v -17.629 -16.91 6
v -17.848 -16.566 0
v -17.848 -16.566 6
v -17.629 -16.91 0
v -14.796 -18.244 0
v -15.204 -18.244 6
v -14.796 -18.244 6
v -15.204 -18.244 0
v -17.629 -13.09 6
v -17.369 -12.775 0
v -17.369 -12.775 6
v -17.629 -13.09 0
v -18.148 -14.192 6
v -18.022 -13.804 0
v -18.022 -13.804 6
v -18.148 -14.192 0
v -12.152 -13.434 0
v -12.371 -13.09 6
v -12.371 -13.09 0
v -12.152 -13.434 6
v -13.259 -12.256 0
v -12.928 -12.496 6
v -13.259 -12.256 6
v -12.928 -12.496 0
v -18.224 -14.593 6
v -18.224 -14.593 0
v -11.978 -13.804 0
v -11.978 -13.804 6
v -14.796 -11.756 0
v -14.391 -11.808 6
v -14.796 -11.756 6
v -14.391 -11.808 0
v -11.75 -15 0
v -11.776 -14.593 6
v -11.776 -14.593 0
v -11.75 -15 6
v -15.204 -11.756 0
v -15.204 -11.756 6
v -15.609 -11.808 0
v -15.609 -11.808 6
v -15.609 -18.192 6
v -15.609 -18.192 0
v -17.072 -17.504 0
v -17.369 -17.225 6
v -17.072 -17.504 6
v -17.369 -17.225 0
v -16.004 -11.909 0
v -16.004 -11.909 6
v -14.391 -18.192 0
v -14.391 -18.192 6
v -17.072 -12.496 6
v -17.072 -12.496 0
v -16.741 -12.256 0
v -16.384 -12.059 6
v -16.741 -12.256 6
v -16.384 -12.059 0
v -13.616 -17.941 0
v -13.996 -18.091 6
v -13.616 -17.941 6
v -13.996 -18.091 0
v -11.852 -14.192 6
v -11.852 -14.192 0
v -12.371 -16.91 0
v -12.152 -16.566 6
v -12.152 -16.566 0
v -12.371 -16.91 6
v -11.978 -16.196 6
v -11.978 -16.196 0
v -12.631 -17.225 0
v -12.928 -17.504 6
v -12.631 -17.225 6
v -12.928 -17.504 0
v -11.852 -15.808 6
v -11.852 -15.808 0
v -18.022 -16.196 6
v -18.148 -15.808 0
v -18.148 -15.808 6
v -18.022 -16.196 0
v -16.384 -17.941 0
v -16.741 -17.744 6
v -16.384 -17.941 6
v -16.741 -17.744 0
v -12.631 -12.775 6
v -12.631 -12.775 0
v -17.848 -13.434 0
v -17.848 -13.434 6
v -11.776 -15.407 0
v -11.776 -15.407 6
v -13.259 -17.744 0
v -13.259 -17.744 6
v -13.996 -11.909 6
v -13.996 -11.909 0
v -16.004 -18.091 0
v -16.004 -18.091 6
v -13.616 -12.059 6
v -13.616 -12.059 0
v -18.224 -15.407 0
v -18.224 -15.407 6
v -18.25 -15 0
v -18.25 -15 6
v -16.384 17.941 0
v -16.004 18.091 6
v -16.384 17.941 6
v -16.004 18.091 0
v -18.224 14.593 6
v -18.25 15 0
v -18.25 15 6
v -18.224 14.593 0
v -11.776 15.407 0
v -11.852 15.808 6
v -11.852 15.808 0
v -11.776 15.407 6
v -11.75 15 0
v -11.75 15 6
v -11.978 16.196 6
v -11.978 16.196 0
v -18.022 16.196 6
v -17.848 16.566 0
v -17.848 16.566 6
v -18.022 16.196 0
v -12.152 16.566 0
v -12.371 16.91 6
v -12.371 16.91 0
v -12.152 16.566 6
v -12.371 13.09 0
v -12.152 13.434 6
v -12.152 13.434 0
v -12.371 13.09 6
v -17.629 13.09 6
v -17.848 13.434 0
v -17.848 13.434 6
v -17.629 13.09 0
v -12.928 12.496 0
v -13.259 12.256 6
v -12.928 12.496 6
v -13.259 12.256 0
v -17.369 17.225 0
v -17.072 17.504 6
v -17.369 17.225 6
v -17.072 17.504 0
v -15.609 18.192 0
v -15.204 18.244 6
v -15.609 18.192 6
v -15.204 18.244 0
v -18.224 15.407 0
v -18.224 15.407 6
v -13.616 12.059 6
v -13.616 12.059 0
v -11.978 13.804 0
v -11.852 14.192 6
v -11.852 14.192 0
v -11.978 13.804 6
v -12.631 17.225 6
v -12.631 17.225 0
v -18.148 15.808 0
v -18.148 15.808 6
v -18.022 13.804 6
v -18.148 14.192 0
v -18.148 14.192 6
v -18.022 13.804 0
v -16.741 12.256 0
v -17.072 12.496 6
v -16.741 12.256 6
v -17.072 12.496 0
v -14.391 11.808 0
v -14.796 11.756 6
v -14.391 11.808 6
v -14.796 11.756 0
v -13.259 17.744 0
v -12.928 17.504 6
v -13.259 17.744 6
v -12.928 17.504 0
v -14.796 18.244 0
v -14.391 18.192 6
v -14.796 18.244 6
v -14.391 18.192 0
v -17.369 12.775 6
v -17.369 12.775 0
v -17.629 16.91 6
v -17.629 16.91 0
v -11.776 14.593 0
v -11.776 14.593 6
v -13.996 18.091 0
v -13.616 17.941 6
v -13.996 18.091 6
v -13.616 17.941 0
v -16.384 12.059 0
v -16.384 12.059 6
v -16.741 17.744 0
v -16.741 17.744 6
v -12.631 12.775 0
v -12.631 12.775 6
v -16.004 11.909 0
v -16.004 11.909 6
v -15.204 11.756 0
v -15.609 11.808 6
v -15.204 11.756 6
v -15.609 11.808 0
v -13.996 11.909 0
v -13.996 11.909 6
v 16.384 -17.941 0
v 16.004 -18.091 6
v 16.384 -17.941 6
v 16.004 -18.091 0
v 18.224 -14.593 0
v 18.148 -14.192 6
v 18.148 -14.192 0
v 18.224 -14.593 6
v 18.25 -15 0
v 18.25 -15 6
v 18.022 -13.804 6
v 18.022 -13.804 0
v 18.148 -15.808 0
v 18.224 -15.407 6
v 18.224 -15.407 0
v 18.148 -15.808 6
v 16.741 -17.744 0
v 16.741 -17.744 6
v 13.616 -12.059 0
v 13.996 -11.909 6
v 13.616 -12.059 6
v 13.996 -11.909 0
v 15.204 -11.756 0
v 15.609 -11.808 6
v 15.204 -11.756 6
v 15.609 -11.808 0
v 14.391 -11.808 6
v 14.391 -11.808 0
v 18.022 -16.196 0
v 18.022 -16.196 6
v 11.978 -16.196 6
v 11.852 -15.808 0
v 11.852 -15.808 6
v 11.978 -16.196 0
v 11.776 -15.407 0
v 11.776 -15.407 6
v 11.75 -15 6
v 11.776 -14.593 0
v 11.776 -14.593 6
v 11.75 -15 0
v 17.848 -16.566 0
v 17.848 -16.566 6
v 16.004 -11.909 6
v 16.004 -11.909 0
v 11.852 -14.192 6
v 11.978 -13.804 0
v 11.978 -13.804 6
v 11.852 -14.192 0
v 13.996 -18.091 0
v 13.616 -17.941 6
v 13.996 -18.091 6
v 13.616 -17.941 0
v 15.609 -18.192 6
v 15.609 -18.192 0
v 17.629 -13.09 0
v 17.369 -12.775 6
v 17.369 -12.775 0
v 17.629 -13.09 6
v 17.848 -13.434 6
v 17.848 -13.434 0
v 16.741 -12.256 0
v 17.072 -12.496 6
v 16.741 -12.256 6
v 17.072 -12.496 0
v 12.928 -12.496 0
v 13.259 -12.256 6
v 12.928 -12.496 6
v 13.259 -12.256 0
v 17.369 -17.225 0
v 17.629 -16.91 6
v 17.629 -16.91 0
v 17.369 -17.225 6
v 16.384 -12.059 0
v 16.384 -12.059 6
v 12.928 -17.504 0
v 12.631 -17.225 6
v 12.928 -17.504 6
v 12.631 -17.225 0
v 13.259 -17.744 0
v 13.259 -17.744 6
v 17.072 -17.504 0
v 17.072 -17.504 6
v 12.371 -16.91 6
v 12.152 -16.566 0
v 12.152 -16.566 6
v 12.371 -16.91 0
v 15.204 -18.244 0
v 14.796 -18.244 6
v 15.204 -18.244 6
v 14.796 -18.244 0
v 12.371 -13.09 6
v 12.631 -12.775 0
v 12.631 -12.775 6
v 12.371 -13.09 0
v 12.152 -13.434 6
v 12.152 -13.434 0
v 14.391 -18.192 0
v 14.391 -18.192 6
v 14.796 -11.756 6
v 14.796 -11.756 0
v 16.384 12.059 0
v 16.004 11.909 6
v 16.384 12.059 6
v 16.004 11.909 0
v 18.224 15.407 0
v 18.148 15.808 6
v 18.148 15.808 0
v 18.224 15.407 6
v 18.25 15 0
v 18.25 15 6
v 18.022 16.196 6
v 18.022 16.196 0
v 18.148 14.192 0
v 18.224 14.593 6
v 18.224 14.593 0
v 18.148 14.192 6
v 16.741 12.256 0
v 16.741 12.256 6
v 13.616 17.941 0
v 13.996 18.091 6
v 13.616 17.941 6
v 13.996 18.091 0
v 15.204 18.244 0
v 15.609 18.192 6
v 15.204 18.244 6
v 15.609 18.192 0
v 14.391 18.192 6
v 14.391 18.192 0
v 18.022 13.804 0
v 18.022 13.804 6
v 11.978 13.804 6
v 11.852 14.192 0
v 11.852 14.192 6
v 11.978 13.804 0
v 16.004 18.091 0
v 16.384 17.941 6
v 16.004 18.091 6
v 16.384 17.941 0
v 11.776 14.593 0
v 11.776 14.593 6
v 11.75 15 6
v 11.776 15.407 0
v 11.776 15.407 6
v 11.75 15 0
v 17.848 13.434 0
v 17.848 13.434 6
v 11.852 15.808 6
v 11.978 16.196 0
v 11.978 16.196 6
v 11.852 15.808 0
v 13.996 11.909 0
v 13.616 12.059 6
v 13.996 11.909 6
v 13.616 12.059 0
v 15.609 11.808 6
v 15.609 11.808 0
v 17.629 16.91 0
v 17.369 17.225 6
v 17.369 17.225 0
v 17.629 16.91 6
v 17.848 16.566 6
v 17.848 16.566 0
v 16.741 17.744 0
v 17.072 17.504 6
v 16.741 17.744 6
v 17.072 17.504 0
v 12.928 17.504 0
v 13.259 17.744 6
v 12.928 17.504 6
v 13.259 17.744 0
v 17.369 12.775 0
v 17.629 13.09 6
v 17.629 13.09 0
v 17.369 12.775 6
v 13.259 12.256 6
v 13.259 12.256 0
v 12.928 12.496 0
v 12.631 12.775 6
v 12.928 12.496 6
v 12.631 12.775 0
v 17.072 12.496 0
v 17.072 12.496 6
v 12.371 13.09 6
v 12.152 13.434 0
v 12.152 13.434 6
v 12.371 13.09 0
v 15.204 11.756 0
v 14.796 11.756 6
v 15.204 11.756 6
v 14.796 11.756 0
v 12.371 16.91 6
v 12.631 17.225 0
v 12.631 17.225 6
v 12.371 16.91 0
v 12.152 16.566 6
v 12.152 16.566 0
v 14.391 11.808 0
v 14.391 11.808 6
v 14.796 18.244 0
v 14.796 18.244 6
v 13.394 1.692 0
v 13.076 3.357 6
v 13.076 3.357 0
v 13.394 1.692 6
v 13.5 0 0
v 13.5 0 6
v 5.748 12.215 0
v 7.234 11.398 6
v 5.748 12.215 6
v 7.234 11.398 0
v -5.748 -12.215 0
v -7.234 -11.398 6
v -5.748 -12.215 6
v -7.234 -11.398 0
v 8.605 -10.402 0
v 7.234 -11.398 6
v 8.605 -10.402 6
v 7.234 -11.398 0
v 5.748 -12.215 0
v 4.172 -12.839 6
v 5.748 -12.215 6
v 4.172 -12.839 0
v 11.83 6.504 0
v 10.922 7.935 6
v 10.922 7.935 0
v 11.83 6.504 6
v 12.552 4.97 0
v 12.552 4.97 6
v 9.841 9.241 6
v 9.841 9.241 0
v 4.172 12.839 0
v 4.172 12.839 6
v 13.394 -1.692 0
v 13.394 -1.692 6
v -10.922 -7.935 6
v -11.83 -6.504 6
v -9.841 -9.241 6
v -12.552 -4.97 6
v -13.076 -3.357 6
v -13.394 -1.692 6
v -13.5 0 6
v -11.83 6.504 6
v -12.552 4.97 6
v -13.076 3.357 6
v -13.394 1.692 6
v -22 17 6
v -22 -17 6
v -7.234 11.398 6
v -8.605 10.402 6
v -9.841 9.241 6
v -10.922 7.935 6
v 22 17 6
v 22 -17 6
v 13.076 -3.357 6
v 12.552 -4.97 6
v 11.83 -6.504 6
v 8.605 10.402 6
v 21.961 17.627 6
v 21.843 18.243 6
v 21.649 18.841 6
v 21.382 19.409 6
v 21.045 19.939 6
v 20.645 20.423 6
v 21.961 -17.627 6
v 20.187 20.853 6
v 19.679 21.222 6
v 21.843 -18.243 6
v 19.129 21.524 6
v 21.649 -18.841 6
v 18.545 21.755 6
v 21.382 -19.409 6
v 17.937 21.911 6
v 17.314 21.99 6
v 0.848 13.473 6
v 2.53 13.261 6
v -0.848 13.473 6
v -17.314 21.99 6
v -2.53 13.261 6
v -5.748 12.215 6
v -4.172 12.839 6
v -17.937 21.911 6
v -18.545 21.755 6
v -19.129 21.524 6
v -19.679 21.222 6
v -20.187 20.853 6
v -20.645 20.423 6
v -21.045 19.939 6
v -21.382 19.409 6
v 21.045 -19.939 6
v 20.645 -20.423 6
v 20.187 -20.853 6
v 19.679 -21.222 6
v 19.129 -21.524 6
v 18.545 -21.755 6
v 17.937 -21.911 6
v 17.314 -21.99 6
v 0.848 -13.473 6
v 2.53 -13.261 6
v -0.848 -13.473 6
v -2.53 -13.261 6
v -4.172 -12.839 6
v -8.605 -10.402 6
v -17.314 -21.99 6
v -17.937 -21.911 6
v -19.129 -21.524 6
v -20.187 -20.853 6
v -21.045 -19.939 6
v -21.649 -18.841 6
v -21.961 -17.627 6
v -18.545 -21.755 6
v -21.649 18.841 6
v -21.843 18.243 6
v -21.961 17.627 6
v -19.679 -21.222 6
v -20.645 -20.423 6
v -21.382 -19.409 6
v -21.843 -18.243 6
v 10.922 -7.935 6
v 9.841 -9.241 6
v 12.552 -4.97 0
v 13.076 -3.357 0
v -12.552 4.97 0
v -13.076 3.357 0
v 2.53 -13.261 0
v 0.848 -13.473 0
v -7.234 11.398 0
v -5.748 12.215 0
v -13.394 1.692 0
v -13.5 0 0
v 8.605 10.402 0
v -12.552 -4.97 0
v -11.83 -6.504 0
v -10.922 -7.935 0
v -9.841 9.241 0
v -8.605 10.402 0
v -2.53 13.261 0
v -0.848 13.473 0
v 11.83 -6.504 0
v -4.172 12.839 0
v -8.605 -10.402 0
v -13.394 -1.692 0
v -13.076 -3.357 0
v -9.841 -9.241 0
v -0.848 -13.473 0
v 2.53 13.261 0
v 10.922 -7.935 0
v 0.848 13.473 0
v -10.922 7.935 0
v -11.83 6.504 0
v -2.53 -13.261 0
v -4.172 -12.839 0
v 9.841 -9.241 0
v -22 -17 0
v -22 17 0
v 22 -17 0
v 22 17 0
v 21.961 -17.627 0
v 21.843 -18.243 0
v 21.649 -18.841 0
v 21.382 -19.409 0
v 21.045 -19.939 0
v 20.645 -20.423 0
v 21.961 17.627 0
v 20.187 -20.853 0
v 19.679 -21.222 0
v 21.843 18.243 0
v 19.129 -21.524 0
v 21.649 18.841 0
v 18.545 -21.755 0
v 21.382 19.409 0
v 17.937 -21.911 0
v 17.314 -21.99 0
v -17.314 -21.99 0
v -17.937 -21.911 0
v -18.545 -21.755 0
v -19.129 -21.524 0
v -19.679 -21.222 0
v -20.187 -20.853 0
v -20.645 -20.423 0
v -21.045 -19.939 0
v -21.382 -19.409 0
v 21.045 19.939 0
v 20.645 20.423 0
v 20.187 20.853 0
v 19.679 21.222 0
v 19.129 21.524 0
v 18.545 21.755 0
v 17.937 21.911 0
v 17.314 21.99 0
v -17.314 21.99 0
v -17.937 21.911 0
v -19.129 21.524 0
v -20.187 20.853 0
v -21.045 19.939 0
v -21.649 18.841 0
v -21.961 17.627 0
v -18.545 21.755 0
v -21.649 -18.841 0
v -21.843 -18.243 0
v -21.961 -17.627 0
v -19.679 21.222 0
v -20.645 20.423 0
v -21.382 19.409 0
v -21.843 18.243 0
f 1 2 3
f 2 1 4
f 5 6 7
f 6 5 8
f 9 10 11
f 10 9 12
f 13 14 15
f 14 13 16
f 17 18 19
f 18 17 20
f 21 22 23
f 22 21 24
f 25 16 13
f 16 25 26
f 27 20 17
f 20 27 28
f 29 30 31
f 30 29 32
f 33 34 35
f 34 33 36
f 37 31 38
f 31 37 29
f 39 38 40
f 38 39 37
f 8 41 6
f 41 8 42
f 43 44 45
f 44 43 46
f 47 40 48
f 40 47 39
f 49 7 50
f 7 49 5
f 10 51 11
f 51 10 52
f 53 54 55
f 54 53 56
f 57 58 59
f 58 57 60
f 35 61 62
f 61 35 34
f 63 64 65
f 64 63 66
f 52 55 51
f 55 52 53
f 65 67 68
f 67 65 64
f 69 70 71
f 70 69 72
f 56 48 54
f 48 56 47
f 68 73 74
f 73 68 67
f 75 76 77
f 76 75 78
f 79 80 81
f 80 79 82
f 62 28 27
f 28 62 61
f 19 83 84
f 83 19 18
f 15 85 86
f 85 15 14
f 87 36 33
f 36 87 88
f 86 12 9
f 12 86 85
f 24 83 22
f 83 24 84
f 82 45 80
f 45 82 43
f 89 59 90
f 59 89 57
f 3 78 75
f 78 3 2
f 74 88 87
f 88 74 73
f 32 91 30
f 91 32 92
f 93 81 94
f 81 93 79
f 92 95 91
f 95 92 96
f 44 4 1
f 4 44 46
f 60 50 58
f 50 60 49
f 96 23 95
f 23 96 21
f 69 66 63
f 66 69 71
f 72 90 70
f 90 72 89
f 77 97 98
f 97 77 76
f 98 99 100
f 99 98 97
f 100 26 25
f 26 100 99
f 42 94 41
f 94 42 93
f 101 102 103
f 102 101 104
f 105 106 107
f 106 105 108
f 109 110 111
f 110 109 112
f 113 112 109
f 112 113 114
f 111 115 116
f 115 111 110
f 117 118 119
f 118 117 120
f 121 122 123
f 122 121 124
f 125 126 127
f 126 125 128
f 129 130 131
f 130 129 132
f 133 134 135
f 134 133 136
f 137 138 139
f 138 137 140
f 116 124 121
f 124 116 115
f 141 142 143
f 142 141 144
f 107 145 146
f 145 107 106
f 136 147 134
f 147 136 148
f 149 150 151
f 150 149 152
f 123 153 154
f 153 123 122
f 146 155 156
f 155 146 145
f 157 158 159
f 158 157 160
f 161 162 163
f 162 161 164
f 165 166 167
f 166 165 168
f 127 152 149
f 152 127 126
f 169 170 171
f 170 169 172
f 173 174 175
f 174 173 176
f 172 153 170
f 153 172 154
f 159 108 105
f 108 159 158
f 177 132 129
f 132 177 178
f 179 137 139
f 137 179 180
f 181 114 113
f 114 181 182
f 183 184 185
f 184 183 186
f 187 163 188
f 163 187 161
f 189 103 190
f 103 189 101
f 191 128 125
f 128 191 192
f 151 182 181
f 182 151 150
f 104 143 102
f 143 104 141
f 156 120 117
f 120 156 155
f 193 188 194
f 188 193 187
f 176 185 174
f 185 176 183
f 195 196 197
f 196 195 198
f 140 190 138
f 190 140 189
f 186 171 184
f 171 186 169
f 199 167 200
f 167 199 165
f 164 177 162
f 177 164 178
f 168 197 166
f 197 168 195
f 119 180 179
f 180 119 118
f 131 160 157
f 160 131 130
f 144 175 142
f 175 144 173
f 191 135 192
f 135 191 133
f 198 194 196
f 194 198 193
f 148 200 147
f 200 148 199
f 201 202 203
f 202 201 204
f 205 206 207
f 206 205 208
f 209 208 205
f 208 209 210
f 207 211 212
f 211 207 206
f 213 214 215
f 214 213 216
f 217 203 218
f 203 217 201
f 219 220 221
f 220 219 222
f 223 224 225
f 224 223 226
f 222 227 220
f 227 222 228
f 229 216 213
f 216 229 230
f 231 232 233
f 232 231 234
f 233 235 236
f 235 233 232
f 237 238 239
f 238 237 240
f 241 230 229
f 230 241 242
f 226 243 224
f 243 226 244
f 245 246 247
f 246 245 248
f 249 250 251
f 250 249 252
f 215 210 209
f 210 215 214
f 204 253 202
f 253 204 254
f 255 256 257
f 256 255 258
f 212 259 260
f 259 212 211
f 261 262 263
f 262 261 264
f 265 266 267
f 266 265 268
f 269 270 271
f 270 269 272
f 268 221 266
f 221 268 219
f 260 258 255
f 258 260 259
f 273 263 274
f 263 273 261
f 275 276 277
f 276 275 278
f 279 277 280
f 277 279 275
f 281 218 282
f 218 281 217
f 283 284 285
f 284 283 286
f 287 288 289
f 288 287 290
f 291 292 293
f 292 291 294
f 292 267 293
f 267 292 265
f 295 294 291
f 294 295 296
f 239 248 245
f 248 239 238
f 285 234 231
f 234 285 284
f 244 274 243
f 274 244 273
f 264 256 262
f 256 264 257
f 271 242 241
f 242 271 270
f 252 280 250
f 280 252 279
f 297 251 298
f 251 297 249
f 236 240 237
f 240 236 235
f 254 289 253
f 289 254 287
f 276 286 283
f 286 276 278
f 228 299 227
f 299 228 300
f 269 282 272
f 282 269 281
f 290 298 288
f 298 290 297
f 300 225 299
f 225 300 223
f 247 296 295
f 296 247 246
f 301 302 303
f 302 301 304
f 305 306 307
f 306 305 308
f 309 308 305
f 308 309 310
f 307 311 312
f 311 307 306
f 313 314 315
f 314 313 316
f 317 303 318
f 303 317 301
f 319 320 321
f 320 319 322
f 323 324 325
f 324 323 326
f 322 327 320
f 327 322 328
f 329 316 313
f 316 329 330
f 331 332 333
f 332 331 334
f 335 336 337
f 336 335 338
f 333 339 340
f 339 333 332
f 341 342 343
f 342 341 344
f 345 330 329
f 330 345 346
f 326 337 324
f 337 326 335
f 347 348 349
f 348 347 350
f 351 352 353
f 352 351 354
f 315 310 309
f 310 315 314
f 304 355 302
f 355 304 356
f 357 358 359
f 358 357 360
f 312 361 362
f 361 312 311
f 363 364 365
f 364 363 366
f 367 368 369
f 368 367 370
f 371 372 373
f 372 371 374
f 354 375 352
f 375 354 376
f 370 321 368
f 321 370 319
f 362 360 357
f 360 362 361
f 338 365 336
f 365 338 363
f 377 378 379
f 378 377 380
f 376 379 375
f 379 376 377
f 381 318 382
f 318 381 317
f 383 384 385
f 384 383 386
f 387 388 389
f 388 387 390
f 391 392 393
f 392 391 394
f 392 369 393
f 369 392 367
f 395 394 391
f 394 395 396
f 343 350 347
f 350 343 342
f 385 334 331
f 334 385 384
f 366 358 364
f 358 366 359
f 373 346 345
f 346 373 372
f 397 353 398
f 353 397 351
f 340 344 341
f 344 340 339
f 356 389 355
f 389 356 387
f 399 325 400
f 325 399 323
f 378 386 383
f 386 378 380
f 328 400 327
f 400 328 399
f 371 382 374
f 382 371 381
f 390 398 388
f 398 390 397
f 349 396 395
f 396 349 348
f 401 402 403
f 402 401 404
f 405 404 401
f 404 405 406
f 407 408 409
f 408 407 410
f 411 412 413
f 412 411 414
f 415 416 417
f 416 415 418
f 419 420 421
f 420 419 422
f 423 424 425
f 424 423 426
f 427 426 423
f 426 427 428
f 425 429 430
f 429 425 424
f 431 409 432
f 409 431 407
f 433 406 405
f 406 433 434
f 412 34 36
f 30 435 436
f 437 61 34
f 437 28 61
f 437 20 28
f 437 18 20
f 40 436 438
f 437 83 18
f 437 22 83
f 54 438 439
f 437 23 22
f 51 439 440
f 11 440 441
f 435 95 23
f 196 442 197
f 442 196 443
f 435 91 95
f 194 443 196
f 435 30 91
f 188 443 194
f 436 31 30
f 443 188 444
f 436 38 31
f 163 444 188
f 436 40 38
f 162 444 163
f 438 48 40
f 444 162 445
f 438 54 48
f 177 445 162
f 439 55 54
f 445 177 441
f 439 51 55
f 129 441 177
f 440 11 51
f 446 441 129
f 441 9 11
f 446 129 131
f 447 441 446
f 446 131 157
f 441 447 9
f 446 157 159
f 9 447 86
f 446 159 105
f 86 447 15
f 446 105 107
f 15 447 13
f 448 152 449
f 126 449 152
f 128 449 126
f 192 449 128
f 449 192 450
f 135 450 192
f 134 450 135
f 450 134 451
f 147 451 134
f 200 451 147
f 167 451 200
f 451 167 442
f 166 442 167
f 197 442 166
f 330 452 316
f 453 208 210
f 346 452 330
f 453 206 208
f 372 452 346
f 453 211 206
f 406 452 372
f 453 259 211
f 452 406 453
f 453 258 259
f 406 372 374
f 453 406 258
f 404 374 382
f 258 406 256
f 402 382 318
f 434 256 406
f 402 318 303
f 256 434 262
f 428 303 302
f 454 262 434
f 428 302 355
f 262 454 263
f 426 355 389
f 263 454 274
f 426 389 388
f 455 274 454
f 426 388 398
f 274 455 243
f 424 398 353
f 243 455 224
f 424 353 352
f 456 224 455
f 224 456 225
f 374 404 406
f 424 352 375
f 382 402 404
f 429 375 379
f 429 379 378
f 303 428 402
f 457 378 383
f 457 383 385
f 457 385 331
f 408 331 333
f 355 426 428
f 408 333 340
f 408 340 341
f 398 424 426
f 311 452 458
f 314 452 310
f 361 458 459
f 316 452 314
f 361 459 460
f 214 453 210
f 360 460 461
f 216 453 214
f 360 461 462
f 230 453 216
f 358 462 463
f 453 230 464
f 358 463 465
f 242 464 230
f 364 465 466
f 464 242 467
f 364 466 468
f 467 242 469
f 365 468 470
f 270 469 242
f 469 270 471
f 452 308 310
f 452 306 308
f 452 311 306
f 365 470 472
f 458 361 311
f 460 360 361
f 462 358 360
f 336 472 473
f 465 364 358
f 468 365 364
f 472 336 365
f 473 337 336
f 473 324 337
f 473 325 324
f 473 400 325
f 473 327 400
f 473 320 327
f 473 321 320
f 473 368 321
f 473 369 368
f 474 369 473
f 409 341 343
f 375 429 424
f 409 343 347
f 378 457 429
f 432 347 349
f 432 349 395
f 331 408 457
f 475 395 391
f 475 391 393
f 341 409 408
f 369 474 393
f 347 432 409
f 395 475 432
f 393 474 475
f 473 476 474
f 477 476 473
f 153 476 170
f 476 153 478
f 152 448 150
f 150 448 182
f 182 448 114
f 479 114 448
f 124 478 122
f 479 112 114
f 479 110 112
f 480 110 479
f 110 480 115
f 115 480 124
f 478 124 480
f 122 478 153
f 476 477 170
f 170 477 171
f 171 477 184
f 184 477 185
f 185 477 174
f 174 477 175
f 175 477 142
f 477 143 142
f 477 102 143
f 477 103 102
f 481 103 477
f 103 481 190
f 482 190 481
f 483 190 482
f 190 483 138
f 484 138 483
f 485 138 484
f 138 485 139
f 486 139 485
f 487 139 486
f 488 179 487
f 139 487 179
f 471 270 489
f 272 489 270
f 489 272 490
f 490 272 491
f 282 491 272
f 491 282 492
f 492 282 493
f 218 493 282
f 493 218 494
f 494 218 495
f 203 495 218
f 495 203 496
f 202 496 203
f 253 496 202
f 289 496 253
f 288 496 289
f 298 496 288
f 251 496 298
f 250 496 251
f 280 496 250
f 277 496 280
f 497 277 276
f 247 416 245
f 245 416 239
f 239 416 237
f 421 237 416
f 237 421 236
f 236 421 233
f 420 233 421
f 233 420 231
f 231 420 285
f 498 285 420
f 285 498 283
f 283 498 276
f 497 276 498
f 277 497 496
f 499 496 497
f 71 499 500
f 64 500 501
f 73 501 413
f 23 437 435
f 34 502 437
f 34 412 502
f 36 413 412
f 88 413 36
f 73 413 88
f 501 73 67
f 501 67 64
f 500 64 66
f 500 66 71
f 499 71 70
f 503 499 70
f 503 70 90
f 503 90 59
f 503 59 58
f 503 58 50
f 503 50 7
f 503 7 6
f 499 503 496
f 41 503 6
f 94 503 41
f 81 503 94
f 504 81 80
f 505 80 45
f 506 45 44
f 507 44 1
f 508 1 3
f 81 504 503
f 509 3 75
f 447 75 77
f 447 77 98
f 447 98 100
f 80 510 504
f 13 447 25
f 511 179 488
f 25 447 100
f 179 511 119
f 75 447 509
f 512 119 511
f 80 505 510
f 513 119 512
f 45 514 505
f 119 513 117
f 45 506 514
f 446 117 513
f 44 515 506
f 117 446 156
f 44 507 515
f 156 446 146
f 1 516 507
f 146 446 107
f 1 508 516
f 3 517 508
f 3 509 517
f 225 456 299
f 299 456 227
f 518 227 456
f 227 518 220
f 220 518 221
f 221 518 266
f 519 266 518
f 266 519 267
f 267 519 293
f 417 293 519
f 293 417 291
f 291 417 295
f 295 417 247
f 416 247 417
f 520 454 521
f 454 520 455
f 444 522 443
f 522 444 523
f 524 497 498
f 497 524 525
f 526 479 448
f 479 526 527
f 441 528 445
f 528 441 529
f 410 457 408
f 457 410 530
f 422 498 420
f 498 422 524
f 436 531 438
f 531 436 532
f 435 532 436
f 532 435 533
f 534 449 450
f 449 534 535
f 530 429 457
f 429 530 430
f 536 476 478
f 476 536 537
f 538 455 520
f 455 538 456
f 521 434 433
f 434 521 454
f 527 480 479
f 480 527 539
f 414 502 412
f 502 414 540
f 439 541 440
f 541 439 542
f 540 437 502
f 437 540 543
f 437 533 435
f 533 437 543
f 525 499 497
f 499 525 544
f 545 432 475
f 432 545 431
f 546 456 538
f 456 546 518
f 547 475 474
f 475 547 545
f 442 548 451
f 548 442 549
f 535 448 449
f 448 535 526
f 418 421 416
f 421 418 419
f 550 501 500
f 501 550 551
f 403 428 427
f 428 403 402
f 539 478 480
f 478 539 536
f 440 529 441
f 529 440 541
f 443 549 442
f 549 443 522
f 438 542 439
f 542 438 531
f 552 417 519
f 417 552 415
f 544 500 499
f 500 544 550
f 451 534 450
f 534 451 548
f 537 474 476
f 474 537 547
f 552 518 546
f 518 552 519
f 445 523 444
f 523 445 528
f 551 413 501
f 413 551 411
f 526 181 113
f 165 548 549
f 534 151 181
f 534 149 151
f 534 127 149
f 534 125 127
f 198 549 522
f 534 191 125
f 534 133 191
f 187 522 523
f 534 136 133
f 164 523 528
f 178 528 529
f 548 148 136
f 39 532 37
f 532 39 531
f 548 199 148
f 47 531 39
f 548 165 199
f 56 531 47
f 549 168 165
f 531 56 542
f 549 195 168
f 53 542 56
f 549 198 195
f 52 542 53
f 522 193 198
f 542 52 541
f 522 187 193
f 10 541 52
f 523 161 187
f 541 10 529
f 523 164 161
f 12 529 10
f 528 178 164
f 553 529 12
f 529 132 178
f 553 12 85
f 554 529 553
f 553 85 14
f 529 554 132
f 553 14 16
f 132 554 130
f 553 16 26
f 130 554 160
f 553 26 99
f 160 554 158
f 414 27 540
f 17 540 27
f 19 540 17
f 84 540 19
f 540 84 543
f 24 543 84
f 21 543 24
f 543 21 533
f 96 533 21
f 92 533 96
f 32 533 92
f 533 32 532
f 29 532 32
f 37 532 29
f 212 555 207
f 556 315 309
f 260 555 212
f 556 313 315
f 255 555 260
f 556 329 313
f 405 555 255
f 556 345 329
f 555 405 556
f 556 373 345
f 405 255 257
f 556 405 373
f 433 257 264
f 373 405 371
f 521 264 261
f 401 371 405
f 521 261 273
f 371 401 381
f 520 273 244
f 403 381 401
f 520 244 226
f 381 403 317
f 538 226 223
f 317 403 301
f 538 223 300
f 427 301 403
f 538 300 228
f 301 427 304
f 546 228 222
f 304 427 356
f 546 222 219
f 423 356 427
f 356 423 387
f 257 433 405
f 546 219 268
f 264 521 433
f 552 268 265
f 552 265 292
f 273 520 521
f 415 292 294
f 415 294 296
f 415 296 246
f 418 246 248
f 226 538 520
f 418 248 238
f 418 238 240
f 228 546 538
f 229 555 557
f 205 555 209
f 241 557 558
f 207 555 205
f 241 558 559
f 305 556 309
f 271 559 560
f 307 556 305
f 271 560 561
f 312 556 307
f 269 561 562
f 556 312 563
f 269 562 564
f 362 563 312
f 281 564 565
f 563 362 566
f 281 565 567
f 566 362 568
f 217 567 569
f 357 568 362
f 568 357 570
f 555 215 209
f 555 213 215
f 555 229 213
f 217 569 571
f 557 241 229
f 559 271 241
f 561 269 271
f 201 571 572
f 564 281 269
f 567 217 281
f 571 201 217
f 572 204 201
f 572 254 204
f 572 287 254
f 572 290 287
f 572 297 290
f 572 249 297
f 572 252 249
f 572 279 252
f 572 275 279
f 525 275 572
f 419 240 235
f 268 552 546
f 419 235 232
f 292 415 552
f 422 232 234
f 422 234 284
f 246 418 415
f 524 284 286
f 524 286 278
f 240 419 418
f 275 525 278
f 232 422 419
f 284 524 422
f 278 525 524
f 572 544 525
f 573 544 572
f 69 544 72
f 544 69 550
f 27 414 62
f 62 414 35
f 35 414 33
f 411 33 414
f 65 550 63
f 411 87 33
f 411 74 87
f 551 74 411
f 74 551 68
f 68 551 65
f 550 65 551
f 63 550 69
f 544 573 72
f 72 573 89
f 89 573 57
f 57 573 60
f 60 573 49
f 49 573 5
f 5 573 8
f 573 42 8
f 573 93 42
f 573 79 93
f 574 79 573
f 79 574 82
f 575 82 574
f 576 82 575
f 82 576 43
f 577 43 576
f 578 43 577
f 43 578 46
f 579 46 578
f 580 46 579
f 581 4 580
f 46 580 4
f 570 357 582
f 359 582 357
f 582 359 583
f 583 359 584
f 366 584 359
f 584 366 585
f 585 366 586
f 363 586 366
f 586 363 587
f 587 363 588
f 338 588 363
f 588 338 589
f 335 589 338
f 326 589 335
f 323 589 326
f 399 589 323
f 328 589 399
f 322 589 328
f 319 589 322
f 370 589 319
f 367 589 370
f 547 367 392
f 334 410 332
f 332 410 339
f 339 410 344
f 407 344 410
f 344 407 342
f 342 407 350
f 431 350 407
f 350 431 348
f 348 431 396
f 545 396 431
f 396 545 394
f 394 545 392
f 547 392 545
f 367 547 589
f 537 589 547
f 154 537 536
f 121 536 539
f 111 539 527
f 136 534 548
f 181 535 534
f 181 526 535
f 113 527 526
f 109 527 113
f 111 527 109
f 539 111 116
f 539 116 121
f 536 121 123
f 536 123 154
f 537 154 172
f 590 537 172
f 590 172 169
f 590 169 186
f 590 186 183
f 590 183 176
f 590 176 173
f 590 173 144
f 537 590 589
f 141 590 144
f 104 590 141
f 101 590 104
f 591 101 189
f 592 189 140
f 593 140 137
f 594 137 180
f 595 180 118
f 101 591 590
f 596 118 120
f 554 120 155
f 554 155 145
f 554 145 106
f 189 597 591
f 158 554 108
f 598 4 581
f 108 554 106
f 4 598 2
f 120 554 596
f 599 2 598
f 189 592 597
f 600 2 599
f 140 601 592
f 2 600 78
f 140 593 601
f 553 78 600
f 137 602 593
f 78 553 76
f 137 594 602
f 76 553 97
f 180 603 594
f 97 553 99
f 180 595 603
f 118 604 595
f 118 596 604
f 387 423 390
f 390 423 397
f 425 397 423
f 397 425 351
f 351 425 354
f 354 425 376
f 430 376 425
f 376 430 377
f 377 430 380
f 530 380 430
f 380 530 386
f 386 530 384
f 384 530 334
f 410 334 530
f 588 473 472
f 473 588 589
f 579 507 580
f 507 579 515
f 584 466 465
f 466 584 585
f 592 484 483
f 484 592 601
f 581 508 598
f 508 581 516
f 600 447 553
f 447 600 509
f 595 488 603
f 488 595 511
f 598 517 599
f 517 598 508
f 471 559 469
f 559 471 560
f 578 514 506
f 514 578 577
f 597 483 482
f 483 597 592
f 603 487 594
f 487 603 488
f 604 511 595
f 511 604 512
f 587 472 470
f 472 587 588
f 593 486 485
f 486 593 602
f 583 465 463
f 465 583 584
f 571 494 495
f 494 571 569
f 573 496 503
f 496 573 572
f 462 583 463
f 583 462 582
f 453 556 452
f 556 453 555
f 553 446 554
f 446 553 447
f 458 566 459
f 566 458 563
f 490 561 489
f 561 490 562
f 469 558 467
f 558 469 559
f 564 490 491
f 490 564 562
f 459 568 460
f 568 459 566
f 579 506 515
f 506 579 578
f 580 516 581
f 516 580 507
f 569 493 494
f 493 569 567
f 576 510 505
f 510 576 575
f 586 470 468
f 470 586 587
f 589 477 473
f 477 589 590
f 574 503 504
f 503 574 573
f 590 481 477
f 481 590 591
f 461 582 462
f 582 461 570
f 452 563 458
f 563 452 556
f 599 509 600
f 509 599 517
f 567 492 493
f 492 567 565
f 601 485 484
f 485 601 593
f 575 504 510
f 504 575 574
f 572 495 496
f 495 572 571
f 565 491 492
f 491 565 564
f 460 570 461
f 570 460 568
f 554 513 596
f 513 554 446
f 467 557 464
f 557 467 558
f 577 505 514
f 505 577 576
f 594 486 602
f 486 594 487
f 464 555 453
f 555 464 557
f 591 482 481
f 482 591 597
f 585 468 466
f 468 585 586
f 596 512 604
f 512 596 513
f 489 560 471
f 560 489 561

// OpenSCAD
$fn = 50;


difference() {
	union() {
		hull() {
			translate(v = [-17.0000000000, 17.0000000000, 0]) {
				cylinder(h = 6, r = 5);
			}
			translate(v = [17.0000000000, 17.0000000000, 0]) {
				cylinder(h = 6, r = 5);
			}
			translate(v = [-17.0000000000, -17.0000000000, 0]) {
				cylinder(h = 6, r = 5);
			}
			translate(v = [17.0000000000, -17.0000000000, 0]) {
				cylinder(h = 6, r = 5);
			}
		}
	}
	union() {
		#translate(v = [-15.0000000000, -15.0000000000, -100.0000000000]) {
			cylinder(h = 200, r = 3.2500000000);
		}
		#translate(v = [-15.0000000000, 15.0000000000, -100.0000000000]) {
			cylinder(h = 200, r = 3.2500000000);
		}
		#translate(v = [15.0000000000, -15.0000000000, -100.0000000000]) {
			cylinder(h = 200, r = 3.2500000000);
		}
		#translate(v = [15.0000000000, 15.0000000000, -100.0000000000]) {
			cylinder(h = 200, r = 3.2500000000);
		}
		#cylinder(h = 6, r = 13.5000000000);
	}
}
